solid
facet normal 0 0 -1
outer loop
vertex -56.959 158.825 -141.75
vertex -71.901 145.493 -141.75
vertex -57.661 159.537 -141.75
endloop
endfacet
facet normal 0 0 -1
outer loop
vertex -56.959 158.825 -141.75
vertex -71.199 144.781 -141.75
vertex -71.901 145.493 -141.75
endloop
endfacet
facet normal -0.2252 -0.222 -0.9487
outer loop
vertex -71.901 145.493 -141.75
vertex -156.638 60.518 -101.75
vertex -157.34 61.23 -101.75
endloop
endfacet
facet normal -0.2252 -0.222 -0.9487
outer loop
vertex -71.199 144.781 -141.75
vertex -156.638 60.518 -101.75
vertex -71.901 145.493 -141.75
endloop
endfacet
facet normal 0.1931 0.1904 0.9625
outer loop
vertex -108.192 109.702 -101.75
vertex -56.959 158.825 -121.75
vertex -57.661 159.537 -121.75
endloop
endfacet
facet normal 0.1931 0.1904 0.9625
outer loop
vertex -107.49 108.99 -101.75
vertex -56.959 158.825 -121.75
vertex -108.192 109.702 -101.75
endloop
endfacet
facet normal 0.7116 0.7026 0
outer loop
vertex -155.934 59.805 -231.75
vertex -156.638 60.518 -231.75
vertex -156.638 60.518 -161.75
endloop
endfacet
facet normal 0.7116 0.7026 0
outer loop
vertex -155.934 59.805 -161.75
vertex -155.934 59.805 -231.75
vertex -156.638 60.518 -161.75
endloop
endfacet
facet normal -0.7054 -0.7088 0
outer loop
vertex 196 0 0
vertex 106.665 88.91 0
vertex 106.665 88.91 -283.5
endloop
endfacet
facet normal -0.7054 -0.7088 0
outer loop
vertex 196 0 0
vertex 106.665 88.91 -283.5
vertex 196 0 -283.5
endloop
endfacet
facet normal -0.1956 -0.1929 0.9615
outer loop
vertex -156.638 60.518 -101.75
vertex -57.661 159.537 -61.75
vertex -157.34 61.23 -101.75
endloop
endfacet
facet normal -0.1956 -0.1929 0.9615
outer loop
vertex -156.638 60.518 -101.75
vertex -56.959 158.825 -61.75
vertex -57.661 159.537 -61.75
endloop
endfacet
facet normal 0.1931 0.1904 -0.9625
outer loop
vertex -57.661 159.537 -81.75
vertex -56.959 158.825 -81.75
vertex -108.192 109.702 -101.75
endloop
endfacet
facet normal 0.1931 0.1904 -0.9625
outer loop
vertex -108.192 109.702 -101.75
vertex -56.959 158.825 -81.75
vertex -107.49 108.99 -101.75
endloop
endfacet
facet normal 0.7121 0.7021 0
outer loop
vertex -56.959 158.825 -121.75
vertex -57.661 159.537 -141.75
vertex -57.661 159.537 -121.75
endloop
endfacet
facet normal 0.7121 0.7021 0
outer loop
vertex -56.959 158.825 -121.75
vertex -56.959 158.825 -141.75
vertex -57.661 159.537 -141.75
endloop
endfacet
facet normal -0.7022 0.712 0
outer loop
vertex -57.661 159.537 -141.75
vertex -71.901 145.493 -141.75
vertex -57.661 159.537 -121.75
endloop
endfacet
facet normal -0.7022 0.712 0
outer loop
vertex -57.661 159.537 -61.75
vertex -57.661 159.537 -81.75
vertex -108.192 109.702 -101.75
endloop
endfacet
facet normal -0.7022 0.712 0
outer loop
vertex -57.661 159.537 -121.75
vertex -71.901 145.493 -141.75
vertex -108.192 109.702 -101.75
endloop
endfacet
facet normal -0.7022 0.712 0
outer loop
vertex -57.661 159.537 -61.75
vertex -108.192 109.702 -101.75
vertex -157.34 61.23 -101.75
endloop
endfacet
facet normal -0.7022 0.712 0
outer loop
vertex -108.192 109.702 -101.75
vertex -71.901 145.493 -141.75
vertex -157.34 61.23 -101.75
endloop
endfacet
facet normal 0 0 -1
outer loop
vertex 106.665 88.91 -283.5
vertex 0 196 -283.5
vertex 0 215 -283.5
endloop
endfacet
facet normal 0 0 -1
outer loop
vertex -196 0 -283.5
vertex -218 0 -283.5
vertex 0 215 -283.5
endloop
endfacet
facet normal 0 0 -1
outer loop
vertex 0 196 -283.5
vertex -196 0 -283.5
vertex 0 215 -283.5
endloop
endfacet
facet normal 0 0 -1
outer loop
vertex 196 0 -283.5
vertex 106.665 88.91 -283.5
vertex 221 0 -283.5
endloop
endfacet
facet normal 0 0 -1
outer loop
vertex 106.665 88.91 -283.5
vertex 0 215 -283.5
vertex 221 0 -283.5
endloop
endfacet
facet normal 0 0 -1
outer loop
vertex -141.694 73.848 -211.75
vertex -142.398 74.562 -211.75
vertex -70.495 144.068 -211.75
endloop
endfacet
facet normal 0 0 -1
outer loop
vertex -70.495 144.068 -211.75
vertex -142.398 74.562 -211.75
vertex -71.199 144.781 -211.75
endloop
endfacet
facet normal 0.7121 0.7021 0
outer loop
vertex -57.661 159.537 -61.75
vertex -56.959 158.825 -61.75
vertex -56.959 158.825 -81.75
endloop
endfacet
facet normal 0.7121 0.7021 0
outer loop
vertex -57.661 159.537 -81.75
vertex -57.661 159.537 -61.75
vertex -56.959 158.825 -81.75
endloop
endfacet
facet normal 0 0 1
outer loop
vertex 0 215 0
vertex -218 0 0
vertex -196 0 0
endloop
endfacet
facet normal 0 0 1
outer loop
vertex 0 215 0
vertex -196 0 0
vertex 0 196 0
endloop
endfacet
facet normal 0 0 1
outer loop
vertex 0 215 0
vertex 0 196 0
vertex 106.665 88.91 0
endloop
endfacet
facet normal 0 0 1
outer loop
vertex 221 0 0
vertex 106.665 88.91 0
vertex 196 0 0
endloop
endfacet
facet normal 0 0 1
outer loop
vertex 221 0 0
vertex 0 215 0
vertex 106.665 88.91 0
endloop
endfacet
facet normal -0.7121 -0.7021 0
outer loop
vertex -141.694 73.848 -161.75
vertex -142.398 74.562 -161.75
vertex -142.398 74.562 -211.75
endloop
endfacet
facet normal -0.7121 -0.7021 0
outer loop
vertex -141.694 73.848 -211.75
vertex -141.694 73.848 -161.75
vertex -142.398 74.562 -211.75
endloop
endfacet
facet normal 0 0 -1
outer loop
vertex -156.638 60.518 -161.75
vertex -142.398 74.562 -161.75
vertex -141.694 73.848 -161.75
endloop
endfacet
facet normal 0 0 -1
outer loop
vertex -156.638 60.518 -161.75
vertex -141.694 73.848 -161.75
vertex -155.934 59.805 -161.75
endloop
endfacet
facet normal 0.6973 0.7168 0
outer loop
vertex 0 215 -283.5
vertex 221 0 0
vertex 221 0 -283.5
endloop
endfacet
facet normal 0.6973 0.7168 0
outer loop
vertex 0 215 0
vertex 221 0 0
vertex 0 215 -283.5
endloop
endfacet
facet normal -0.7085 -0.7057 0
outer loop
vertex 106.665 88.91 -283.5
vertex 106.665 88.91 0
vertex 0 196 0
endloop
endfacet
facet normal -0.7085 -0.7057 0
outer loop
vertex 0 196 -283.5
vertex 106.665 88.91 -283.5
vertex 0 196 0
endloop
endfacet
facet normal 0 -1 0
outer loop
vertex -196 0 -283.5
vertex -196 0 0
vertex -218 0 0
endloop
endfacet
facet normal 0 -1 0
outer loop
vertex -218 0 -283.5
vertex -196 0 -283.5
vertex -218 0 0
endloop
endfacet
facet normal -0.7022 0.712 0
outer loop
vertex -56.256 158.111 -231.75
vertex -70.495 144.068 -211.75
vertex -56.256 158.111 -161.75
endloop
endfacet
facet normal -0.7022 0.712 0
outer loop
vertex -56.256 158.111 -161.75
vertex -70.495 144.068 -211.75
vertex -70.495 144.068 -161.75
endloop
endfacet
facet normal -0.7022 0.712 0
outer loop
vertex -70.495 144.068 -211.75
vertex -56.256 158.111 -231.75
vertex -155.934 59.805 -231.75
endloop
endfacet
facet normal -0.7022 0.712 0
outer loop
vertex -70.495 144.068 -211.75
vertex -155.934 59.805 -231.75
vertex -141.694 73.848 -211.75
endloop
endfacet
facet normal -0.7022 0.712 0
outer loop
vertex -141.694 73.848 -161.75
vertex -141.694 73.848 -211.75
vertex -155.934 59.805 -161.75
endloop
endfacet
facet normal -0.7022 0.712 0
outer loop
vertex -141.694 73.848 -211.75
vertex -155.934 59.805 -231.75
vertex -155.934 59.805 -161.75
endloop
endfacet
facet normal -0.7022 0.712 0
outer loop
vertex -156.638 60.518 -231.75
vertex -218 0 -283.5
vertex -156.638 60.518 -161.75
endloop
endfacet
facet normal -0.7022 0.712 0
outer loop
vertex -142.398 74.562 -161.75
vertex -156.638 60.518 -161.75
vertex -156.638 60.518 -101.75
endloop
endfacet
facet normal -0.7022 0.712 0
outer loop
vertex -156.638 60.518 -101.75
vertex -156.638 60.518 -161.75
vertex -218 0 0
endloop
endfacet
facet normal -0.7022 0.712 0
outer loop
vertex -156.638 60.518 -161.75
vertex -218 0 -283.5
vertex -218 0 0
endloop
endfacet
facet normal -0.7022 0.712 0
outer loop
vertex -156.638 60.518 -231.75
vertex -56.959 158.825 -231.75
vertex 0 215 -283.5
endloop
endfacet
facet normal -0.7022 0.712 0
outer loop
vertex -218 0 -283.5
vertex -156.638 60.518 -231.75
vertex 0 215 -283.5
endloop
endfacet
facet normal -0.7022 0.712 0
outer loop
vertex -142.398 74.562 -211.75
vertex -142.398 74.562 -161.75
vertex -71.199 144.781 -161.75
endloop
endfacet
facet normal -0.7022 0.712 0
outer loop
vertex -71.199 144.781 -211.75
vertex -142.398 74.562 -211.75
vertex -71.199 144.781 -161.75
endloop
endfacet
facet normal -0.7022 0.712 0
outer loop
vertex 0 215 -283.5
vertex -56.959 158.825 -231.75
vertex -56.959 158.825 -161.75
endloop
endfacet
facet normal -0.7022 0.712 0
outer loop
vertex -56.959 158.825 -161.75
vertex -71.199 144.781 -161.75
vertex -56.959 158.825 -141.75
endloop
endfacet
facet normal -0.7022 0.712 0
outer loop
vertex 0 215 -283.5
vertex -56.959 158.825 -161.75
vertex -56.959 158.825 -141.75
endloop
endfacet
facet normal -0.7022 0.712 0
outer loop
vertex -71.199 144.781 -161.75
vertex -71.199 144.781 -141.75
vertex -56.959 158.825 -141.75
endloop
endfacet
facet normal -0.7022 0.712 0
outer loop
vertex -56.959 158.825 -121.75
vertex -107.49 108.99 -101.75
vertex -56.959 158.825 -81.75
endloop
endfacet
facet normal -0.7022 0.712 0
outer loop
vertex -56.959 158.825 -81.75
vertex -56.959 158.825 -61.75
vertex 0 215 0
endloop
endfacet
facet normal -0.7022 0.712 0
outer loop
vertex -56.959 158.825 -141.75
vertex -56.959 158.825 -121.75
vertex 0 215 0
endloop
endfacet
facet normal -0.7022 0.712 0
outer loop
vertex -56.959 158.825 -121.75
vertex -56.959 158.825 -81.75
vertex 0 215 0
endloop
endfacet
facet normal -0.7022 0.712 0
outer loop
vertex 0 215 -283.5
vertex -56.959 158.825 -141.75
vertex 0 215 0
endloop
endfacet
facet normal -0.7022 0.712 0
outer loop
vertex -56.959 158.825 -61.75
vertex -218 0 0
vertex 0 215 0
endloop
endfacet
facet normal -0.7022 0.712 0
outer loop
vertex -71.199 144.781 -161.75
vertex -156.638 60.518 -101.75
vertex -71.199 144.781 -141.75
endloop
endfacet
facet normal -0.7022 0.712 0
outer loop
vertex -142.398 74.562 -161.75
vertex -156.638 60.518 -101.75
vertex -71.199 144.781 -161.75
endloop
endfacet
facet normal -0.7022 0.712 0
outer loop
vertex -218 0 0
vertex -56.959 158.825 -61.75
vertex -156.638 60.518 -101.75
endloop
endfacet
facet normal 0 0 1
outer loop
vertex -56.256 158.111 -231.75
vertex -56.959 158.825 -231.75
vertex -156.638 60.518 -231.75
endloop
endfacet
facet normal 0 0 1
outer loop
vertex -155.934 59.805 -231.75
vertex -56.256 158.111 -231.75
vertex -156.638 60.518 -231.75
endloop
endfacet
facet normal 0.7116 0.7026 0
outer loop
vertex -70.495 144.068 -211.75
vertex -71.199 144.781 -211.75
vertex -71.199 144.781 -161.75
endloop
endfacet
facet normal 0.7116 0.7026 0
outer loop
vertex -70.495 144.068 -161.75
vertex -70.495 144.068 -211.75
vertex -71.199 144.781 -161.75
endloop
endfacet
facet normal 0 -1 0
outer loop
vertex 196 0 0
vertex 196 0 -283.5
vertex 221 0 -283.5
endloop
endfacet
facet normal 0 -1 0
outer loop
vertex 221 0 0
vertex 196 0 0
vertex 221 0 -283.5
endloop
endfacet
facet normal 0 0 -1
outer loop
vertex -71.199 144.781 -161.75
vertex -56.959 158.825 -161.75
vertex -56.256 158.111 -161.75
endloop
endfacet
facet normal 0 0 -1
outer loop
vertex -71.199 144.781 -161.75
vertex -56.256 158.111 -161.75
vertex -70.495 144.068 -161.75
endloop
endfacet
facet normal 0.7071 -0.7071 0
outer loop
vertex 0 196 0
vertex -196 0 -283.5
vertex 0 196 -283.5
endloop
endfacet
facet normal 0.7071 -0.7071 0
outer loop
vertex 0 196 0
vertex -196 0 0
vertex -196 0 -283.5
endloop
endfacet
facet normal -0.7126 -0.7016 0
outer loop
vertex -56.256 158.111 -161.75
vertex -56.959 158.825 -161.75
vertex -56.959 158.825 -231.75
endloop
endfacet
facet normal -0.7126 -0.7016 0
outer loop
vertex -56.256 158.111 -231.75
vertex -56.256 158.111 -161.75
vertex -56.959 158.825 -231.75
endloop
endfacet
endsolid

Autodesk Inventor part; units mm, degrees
ref_plane "YZ Plane" through (0, 0, 0) normal (1, 0, 0) x (0, 1, 0)
ref_plane "XZ Plane" through (0, 0, 0) normal (0, 1, 0) x (-1, 0, 0)
sketch "Boceto2" plane through (0, 0, 0) normal (0, 0, 1) x (1, 0, 0)
  line L0 (0, 0) -> (196, 0)
  line L1 (0, 0) -> (-196, 0)
  line L2 (0, 0) -> (0, 215)
  line L3 (-196, 0) -> (-218, 0)
  line L4 (-218, 0) -> (0, 215)
  line L5 (-263.5923, -44.9649) -> (-252.2786, -56.2786)
  line L6 (-263.5923, -44.9649) -> (-247.5923, -44.9649) construction
  line L7 (-252.2786, -56.2786) -> (0, 196)
  line L8 (-252.2786, -56.2786) -> (-196, 0)
  line L9 (196, 0) -> (221, 0)
  line L10 (221, 0) -> (0, 215)
  line L11 (117.9791, 100.2239) -> (106.6654, 88.9102)
  line L12 (117.9791, 100.2239) -> (133.9791, 100.2239) construction
  line L13 (106.6654, 88.9102) -> (0, 196)
  line L14 (106.6654, 88.9102) -> (196, 0)
  dimension "d0" = 196
  dimension "d1" = 196
  dimension "d2" = 215
  dimension "d3" = 22
  dimension "d4" = 16
  dimension "d5" = 45
  dimension "d6" = 25
  dimension "d7" = 16
  dimension "d8" = 135
extrude "Extrusión1" add sketch "Boceto2" against normal blind 283.5 contours L14 L11 L10 L9 | L3 L4 L2 L7 | L2 L10 L11 L13
ref_plane "Plano de trabajo1" through (0, 215, -283.5) normal (0.7021908, -0.7119888, 0) x (0, 0, 1)
sketch "Boceto3" plane through (0, 215, -283.5) normal (0.7021908, -0.7119888, 0) x (0, 0, 1)
  line L0 (283.5, 150.971) -> (0, 150.971)
  line L1 (0, 306.1846) -> (0, 0) projected
  line L2 (283.5, -6.3785) -> (0, -6.3785) projected
  line L3 (141.75, 150.971) -> (141.75, 0)
  line L4 (283.5, 0) -> (0, 0) projected
  line L5 (141.75, 0) -> (141.75, 80)
  line L6 (121.75, 80) -> (51.75, 80)
  line L7 (51.75, 80) -> (51.75, 220)
  line L8 (51.75, 220) -> (121.75, 220)
  line L9 (121.75, 200) -> (71.75, 200)
  line L10 (71.75, 200) -> (71.75, 100)
  line L11 (71.75, 100) -> (121.75, 100)
  line L12 (141.75, 80) -> (161.75, 80)
  line L13 (181.75, 220) -> (141.75, 100)
  line L14 (221.75, 80) -> (181.75, 220)
  line L15 (221.75, 80) -> (201.75, 80)
  line L16 (201.75, 80) -> (181.75, 150.971)
  line L17 (161.75, 80) -> (181.75, 150.971)
  line L18 (141.75, 80) -> (135.0833, 80)
  line L19 (121.75, 80) -> (121.75, 220)
  line L20 (135.0833, 80) -> (142.2633, 101.5399)
  point P0 (141.75, 220)
  point P1 (141.75, 200)
  dimension "d28" = 90
  dimension "d29" = 100
  dimension "d30" = 70
  dimension "d31" = 20
extrude "Extrusión2" cut sketch "Boceto3" along normal blind 1 contours L10 L11 L19 L6 L7 L0 | L0 L7 L8 L19 L9 L10
extrude "Extrusión3" add sketch "Boceto3" against normal blind 1 contours L14 L15 L16 L0 | L0 L13 L14 | L17 L12 L3 L13 L0
properties part number "TABLERO"
